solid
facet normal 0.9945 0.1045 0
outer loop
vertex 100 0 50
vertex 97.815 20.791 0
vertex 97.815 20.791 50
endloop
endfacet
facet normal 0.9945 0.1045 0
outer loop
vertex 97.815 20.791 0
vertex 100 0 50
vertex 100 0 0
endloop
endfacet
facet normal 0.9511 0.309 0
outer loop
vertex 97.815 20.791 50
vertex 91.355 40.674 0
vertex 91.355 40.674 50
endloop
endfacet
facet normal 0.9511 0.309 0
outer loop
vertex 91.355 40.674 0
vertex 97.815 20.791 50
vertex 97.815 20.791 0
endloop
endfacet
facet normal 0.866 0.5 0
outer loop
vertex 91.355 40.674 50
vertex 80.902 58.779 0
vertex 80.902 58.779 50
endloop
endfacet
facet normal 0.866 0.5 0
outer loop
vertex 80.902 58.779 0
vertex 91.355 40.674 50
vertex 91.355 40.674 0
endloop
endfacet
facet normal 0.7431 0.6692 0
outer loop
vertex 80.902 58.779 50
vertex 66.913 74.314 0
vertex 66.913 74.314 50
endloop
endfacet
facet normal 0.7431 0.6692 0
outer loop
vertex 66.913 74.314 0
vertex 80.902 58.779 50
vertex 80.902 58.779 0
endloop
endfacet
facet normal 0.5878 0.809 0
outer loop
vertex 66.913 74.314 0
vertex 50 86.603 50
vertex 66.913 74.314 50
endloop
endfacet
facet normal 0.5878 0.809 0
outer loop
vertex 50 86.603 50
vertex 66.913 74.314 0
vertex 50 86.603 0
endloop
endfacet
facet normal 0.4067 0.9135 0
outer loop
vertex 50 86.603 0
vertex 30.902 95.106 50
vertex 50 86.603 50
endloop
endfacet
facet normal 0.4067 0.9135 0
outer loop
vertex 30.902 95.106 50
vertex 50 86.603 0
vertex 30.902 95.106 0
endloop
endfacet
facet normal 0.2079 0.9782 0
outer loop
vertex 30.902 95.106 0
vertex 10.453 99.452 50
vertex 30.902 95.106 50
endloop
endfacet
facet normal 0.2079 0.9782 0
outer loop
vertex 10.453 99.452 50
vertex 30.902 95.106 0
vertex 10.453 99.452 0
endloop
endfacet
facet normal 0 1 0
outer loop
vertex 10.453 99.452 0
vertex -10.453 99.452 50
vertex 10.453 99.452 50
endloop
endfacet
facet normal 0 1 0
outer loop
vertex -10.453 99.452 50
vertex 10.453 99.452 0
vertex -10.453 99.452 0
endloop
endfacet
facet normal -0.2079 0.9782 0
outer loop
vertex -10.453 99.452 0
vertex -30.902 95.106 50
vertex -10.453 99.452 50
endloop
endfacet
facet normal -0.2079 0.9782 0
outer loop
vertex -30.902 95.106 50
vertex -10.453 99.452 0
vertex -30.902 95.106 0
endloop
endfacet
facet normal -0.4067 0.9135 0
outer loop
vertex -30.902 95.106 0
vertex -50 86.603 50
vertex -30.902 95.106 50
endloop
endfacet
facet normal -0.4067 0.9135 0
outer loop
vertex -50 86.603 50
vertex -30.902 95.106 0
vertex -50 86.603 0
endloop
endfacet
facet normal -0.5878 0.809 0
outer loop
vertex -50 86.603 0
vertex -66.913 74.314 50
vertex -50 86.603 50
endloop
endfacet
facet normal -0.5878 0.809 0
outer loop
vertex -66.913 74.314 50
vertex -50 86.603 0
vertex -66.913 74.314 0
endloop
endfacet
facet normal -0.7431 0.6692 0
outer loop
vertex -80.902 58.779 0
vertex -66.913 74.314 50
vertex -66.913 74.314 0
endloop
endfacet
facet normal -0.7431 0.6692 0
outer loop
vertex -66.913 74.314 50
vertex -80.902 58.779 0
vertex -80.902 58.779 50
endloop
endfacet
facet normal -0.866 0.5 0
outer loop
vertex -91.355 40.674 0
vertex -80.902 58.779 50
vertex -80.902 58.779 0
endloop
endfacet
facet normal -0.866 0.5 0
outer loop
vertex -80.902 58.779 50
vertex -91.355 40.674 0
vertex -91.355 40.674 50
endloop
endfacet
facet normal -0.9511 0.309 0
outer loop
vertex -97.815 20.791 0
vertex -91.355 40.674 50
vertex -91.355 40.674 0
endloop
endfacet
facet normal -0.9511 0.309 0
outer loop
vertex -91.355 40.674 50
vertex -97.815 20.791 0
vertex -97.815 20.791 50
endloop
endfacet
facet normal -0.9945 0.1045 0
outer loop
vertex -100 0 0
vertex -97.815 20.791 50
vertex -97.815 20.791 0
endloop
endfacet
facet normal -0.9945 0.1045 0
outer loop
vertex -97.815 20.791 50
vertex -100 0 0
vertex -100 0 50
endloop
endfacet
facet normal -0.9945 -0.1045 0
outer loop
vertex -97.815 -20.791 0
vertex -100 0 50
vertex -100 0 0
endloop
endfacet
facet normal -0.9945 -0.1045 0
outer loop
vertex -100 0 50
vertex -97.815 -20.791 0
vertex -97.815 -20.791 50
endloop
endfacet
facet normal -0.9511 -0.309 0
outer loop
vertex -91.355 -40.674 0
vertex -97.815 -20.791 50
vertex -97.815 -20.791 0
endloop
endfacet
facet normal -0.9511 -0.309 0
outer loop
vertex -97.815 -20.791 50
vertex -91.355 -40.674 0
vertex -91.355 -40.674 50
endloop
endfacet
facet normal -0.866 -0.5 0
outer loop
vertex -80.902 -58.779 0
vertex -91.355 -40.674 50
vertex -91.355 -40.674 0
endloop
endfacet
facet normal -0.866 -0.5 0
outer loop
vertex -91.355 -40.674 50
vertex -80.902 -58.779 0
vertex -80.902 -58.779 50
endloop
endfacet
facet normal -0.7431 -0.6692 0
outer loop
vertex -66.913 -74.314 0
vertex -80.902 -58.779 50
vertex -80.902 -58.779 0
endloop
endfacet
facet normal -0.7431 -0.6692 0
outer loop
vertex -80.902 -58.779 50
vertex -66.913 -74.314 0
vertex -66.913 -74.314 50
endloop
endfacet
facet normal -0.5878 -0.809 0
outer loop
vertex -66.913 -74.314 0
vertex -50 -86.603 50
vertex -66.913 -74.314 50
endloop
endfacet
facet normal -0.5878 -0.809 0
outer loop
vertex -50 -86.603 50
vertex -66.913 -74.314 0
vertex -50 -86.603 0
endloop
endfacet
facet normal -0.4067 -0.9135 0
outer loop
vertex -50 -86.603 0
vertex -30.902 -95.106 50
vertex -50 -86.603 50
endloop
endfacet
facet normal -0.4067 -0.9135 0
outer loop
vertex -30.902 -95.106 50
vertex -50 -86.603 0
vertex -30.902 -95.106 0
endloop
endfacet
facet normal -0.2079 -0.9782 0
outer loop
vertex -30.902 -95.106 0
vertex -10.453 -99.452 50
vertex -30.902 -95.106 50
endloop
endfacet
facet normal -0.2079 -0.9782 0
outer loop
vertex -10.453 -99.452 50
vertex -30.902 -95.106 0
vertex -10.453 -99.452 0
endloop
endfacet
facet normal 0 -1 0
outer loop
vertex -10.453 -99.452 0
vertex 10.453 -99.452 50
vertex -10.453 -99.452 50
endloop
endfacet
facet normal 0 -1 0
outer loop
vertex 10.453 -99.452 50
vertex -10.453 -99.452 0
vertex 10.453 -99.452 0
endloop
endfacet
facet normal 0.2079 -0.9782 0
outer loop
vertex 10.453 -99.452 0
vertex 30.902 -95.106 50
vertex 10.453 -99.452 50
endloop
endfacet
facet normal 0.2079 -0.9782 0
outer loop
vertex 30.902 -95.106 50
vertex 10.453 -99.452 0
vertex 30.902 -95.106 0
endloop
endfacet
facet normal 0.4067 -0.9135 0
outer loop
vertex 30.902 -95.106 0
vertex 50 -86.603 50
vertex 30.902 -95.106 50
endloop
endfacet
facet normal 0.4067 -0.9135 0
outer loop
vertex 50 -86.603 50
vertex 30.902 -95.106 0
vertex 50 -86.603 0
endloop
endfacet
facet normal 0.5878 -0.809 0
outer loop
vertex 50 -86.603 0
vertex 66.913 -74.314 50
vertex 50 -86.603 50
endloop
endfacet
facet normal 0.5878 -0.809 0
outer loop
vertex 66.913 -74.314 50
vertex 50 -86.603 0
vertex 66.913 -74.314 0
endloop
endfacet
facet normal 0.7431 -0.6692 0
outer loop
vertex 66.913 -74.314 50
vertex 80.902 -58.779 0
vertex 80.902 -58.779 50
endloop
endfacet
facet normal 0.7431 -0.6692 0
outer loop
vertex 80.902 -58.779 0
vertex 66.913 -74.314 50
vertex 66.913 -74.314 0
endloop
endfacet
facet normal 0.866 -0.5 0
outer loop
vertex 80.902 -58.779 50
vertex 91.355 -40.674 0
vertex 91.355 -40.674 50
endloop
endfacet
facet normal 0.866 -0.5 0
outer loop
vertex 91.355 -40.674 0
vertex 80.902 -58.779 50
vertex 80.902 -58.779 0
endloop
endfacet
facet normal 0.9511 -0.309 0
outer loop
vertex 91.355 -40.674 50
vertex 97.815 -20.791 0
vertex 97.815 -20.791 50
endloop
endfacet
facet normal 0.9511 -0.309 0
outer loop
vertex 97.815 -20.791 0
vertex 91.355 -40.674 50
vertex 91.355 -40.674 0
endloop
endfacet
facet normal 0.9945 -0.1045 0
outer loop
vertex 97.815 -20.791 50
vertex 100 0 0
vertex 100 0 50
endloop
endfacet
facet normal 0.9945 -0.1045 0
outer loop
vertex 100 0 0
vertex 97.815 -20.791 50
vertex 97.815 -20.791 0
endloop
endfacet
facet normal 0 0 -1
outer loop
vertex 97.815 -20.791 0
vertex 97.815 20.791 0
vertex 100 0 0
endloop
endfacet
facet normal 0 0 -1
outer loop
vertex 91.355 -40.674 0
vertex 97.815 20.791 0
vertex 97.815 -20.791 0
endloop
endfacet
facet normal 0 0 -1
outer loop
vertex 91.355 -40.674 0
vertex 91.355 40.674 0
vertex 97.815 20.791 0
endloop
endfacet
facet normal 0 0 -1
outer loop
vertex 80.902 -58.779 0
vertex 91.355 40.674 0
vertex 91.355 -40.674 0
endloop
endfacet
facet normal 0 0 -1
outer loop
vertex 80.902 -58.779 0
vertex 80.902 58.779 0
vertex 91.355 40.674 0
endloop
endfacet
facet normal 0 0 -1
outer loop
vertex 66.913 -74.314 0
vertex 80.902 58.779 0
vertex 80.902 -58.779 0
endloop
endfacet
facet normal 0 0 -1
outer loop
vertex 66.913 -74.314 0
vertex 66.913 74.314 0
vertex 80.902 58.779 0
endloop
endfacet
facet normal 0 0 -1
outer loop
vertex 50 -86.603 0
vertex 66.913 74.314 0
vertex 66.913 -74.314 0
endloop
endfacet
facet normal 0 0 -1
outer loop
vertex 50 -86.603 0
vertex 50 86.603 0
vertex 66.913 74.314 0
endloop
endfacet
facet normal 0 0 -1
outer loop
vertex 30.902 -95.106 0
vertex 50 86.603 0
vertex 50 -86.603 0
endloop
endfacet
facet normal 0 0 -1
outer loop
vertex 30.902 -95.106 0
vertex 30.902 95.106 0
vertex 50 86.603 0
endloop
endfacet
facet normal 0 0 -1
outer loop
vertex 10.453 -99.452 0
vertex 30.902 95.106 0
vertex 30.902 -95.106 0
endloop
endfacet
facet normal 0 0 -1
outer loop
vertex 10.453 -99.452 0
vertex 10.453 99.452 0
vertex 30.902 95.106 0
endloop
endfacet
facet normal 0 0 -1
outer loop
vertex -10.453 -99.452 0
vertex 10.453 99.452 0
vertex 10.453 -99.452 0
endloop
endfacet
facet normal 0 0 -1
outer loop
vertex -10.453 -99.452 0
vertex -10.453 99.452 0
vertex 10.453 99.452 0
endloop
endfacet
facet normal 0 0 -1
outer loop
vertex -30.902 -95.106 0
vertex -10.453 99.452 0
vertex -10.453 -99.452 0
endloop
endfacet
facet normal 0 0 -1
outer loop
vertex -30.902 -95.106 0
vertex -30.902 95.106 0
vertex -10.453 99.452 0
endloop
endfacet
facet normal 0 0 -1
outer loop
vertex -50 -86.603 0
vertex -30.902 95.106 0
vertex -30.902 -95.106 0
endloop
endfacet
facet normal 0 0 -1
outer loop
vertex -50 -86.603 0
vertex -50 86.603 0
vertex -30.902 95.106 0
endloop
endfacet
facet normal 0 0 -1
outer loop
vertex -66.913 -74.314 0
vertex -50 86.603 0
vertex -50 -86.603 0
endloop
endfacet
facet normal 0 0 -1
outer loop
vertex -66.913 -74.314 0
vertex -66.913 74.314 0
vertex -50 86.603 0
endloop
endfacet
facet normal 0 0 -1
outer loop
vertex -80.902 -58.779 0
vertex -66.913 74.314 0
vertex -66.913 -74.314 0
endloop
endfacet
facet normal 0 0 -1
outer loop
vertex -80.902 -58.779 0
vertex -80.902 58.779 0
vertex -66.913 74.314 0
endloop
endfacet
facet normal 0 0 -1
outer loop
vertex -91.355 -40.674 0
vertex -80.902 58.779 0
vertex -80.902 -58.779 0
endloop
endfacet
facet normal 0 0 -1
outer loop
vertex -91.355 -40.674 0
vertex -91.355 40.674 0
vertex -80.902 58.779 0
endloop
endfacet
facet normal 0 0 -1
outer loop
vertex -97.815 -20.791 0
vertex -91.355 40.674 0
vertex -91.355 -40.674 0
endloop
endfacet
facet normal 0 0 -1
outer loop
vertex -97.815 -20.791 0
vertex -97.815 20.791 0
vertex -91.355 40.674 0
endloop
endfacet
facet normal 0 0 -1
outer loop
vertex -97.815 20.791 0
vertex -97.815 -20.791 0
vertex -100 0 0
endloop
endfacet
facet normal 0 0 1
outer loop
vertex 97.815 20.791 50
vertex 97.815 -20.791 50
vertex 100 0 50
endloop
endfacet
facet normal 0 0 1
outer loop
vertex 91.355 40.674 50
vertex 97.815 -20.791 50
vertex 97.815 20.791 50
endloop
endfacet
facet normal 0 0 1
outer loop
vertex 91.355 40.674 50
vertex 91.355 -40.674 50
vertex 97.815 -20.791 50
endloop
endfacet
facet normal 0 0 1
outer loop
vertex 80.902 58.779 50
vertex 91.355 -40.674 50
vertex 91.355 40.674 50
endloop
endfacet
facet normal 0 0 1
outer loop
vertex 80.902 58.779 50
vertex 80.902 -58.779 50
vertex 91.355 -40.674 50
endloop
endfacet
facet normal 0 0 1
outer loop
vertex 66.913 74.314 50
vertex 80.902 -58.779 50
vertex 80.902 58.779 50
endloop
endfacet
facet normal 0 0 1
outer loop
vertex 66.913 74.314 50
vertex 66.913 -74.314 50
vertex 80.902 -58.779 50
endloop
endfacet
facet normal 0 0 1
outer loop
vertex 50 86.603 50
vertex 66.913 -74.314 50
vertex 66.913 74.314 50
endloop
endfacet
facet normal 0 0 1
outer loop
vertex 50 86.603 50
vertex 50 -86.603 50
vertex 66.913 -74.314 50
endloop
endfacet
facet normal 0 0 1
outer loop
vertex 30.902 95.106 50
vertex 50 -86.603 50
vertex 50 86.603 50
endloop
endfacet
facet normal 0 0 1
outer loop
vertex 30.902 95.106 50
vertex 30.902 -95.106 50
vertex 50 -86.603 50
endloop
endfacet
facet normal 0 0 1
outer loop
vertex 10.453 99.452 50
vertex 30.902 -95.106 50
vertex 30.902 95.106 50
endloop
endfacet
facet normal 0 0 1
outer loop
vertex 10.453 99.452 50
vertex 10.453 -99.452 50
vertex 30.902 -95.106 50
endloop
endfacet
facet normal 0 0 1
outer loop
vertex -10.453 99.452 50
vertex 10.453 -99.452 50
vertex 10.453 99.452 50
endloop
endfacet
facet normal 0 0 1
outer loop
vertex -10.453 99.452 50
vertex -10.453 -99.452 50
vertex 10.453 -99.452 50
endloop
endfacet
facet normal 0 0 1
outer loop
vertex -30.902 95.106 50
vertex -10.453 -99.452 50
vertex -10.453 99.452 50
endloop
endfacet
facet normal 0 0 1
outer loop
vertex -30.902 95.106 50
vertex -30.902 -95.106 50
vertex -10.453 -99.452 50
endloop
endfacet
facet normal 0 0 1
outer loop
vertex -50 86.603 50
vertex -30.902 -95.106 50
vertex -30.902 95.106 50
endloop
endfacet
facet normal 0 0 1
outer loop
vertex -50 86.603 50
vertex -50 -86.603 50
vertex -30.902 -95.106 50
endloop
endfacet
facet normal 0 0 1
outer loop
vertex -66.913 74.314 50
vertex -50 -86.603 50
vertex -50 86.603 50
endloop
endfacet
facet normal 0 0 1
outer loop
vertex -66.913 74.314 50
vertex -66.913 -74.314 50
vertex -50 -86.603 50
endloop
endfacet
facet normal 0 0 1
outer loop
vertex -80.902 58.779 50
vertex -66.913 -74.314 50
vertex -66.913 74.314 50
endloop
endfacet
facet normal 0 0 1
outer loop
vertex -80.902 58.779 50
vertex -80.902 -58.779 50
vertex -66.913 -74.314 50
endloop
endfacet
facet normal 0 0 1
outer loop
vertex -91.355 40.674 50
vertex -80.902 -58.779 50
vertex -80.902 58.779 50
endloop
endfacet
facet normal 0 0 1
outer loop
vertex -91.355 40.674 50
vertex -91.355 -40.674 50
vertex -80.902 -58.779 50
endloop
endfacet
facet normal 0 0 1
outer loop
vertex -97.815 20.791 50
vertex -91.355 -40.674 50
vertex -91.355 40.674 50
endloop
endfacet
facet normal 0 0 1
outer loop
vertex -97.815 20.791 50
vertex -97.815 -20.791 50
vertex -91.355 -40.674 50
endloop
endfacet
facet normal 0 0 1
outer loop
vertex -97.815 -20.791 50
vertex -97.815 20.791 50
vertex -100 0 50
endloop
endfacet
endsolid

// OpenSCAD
my_h = 50;
my_r = 100;
echo("This is a cylinder with h=", my_h, " and r=", my_r);
echo(my_h = my_h, my_r = my_r); // shortcut
cylinder(h = my_h, r = my_r);

a = 1.0;
b = 1.000002;
echo(a);
echo(b);

if (a == b) {//while echoed the same, the values are still distinct
    echo("a==b");
} else if (a > b) {
    echo("a>b");
} else if (a < b) {
    echo("a<b");
} else {
    echo("???");
}

c = 1000002;
d = 0.000002;
echo(c); //1e+06
echo(d); //2e-06

a = 3; b = 5;

// echo() prints values before evaluating the expression
r1 = echo(a, b) a * b; // ECHO: 3, 5

// using let it's still easy to output the result
r2 = let(r = 2 * a * b) echo(r) r; // ECHO: 30

// use echo statement for showing results
echo(r1, r2); // ECHO: 15, 30

v = [4, 7, 9, 12];
function result(x) = echo(result = x) x;
function sum(x, i = 0) = echo(str("x[", i, "]=", x[i])) result(len(x) > i ? x[i] + sum(x, i + 1) : 0);
echo("sum(v) = ", sum(v));
